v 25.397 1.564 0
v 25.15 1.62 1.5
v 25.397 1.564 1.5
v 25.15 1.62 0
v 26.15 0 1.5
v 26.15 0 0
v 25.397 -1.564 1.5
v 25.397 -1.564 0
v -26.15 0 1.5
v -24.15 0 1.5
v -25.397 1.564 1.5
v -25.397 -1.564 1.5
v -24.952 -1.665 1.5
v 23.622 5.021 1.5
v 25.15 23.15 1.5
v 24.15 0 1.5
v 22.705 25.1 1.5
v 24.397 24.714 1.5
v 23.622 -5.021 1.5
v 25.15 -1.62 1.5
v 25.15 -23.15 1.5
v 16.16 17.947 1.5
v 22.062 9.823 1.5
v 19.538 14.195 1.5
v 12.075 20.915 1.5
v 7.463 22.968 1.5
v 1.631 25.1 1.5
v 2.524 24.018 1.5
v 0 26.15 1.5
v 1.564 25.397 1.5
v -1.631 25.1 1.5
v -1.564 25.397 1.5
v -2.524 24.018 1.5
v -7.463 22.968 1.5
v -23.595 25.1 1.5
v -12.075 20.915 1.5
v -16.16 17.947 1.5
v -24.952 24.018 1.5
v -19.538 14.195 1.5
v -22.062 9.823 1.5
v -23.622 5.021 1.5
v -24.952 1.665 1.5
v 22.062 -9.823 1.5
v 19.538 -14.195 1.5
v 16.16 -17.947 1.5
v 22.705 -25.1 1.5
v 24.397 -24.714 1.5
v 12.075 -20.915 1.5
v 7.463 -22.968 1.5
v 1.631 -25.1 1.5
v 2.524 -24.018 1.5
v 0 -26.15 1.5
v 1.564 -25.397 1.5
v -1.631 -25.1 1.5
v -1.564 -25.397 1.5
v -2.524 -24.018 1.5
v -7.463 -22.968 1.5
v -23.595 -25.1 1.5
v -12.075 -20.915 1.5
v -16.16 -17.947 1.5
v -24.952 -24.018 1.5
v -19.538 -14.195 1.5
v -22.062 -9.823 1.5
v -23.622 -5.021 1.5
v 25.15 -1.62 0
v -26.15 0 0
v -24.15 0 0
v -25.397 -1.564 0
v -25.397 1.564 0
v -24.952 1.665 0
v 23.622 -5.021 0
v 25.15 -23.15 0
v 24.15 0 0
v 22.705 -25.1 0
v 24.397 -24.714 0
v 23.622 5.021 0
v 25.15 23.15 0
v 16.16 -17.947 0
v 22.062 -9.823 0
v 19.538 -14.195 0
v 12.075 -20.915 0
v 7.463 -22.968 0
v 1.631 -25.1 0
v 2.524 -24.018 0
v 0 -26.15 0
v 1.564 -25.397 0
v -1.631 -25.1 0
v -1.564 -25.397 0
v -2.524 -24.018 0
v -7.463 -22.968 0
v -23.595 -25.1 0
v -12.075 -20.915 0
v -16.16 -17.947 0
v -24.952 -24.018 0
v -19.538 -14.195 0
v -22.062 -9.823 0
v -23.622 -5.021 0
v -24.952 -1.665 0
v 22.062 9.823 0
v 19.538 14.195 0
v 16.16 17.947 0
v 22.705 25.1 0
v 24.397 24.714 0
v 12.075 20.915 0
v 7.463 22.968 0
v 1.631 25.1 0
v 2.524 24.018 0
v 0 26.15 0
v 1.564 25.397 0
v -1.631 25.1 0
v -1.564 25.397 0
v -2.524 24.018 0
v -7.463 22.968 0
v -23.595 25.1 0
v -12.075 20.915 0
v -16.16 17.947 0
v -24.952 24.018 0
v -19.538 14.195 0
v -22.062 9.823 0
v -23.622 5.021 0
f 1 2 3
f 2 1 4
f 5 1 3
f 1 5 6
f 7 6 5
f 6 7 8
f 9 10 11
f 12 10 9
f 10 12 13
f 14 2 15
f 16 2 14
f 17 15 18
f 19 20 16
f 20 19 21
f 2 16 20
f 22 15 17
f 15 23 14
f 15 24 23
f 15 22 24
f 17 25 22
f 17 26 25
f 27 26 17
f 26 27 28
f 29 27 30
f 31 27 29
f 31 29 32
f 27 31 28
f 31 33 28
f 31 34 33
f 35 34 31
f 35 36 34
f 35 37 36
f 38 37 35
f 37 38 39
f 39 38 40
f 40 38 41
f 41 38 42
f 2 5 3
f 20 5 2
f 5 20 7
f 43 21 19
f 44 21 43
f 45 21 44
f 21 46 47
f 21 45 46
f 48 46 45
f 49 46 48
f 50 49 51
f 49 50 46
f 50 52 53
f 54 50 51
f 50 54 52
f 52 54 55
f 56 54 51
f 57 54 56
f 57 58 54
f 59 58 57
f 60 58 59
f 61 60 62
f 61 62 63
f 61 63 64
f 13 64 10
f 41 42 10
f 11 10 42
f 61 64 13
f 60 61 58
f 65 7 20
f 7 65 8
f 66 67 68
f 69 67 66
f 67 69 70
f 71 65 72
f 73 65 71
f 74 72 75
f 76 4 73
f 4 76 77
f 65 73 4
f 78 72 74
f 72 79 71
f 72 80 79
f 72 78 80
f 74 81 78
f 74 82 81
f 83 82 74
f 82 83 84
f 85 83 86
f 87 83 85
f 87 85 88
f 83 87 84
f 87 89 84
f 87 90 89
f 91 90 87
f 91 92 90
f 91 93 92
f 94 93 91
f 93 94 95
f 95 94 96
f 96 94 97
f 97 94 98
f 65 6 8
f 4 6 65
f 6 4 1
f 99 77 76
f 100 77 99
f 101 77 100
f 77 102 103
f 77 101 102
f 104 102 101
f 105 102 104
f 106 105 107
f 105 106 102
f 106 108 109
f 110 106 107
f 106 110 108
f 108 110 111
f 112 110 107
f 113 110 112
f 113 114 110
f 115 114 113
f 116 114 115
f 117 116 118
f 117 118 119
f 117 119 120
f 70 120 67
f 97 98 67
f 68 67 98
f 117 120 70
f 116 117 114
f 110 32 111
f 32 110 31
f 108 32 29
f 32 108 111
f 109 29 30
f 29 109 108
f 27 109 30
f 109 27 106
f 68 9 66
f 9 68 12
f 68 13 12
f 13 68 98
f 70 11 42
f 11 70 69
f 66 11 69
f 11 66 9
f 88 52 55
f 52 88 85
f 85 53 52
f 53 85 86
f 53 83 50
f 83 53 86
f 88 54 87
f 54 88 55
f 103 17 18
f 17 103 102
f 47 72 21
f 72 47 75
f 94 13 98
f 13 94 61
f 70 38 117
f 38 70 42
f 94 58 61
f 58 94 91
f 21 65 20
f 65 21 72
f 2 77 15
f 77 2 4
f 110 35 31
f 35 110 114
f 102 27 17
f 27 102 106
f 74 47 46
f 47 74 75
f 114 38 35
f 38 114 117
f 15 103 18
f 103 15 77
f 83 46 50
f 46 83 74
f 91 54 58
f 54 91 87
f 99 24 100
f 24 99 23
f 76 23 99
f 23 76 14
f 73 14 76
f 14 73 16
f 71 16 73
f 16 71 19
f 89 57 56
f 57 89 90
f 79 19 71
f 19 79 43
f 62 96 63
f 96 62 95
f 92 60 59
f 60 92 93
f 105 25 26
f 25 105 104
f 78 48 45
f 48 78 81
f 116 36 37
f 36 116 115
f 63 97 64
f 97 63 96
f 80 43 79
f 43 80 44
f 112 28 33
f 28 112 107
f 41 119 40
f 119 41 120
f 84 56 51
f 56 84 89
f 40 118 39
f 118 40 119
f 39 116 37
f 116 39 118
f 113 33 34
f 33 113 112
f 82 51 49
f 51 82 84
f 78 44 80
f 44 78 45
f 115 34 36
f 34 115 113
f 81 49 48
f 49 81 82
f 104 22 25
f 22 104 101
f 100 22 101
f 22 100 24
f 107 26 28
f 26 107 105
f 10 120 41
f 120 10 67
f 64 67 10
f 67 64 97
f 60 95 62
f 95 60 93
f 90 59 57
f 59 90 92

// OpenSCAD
// file: lib.scad
use <lib.scad>

module trayOuter(
  width,
  depth,
  height=3,
  cornerRadius=5,
) {
    translate([((width-(2*cornerRadius)) * -0.5),((depth-(2*cornerRadius)) * -0.5),0]){
      minkowski(){
        cube([(width-(2*cornerRadius)),(depth-(2*cornerRadius)),(height/2)]);
        cylinder(r=cornerRadius,h=(height/2));
    }
  }
}

module trayInner(
  width,
  height=1.5,
  cornerRadius=2,
) {
    translate([((width-(2*cornerRadius)) * -0.5),((width-(2*cornerRadius)) * -0.5),0]){
      minkowski(){
        cube([(width-(2*cornerRadius)),(width-(2*cornerRadius)),(height/2)]);
        cylinder(r=cornerRadius,h=(height/2));
      }
    }
}

module trayInsert(
  width,
  height=1.5,
  filterSize,
  cornerRadius=2,
  fudge=1,
) {
    difference(){
      union(){       
        trayInner(width,height,cornerRadius);
        for (i = [0, 90, 180, 270]){
          rotate([0, 0, i]){
            translate([(width/2 - 1),0,(height/2)]){
              cylinder(h=height,r=2,center=true);
            };
          };
        };            
      };
      cylinder(h=(height*2.2),r=(filterSize/2 - 1),center=true);
    };
};


module filterHolder(
  width,
  depth,
  height=3,
  base=1.5,
  filterSize
) {
  union(){
      // tray
      difference(){
        difference(){
          // tray outer
          trayOuter(width=width,depth=depth,height=height);
          // tray inner void
          #translate([0,0,(height - base)]){
            trayInner(width=filterSize,height=(height+1),cornerRadius=0);
          };
        };
        // central hole
        cylinder(h=10,r=(filterSize/2 - 1),center=true);
      }

      // handle
      translate([(-width/2 - 5),0,1]){
          union(){
              //stem
              cube([11,10,2],center=true);
              //handle
              translate([-5,0,(2-(height/2))]){
                  cube([2.5,13,height],center=true);
              }
          }
      }
  }
};


filterHolder(
  width=63.8,
  depth=63.8,
  height=3,
  filterSize=50.3
);

translate([75,0,0]){
  trayInsert(
    width=50.3,
    height=1.5,
    filterSize=50.3
  );
};
// main file
use <lib.scad>

trayInsert(
  height=1.5,
  width=50.3,
  height=1.5,
  filterSize=50.3
);
